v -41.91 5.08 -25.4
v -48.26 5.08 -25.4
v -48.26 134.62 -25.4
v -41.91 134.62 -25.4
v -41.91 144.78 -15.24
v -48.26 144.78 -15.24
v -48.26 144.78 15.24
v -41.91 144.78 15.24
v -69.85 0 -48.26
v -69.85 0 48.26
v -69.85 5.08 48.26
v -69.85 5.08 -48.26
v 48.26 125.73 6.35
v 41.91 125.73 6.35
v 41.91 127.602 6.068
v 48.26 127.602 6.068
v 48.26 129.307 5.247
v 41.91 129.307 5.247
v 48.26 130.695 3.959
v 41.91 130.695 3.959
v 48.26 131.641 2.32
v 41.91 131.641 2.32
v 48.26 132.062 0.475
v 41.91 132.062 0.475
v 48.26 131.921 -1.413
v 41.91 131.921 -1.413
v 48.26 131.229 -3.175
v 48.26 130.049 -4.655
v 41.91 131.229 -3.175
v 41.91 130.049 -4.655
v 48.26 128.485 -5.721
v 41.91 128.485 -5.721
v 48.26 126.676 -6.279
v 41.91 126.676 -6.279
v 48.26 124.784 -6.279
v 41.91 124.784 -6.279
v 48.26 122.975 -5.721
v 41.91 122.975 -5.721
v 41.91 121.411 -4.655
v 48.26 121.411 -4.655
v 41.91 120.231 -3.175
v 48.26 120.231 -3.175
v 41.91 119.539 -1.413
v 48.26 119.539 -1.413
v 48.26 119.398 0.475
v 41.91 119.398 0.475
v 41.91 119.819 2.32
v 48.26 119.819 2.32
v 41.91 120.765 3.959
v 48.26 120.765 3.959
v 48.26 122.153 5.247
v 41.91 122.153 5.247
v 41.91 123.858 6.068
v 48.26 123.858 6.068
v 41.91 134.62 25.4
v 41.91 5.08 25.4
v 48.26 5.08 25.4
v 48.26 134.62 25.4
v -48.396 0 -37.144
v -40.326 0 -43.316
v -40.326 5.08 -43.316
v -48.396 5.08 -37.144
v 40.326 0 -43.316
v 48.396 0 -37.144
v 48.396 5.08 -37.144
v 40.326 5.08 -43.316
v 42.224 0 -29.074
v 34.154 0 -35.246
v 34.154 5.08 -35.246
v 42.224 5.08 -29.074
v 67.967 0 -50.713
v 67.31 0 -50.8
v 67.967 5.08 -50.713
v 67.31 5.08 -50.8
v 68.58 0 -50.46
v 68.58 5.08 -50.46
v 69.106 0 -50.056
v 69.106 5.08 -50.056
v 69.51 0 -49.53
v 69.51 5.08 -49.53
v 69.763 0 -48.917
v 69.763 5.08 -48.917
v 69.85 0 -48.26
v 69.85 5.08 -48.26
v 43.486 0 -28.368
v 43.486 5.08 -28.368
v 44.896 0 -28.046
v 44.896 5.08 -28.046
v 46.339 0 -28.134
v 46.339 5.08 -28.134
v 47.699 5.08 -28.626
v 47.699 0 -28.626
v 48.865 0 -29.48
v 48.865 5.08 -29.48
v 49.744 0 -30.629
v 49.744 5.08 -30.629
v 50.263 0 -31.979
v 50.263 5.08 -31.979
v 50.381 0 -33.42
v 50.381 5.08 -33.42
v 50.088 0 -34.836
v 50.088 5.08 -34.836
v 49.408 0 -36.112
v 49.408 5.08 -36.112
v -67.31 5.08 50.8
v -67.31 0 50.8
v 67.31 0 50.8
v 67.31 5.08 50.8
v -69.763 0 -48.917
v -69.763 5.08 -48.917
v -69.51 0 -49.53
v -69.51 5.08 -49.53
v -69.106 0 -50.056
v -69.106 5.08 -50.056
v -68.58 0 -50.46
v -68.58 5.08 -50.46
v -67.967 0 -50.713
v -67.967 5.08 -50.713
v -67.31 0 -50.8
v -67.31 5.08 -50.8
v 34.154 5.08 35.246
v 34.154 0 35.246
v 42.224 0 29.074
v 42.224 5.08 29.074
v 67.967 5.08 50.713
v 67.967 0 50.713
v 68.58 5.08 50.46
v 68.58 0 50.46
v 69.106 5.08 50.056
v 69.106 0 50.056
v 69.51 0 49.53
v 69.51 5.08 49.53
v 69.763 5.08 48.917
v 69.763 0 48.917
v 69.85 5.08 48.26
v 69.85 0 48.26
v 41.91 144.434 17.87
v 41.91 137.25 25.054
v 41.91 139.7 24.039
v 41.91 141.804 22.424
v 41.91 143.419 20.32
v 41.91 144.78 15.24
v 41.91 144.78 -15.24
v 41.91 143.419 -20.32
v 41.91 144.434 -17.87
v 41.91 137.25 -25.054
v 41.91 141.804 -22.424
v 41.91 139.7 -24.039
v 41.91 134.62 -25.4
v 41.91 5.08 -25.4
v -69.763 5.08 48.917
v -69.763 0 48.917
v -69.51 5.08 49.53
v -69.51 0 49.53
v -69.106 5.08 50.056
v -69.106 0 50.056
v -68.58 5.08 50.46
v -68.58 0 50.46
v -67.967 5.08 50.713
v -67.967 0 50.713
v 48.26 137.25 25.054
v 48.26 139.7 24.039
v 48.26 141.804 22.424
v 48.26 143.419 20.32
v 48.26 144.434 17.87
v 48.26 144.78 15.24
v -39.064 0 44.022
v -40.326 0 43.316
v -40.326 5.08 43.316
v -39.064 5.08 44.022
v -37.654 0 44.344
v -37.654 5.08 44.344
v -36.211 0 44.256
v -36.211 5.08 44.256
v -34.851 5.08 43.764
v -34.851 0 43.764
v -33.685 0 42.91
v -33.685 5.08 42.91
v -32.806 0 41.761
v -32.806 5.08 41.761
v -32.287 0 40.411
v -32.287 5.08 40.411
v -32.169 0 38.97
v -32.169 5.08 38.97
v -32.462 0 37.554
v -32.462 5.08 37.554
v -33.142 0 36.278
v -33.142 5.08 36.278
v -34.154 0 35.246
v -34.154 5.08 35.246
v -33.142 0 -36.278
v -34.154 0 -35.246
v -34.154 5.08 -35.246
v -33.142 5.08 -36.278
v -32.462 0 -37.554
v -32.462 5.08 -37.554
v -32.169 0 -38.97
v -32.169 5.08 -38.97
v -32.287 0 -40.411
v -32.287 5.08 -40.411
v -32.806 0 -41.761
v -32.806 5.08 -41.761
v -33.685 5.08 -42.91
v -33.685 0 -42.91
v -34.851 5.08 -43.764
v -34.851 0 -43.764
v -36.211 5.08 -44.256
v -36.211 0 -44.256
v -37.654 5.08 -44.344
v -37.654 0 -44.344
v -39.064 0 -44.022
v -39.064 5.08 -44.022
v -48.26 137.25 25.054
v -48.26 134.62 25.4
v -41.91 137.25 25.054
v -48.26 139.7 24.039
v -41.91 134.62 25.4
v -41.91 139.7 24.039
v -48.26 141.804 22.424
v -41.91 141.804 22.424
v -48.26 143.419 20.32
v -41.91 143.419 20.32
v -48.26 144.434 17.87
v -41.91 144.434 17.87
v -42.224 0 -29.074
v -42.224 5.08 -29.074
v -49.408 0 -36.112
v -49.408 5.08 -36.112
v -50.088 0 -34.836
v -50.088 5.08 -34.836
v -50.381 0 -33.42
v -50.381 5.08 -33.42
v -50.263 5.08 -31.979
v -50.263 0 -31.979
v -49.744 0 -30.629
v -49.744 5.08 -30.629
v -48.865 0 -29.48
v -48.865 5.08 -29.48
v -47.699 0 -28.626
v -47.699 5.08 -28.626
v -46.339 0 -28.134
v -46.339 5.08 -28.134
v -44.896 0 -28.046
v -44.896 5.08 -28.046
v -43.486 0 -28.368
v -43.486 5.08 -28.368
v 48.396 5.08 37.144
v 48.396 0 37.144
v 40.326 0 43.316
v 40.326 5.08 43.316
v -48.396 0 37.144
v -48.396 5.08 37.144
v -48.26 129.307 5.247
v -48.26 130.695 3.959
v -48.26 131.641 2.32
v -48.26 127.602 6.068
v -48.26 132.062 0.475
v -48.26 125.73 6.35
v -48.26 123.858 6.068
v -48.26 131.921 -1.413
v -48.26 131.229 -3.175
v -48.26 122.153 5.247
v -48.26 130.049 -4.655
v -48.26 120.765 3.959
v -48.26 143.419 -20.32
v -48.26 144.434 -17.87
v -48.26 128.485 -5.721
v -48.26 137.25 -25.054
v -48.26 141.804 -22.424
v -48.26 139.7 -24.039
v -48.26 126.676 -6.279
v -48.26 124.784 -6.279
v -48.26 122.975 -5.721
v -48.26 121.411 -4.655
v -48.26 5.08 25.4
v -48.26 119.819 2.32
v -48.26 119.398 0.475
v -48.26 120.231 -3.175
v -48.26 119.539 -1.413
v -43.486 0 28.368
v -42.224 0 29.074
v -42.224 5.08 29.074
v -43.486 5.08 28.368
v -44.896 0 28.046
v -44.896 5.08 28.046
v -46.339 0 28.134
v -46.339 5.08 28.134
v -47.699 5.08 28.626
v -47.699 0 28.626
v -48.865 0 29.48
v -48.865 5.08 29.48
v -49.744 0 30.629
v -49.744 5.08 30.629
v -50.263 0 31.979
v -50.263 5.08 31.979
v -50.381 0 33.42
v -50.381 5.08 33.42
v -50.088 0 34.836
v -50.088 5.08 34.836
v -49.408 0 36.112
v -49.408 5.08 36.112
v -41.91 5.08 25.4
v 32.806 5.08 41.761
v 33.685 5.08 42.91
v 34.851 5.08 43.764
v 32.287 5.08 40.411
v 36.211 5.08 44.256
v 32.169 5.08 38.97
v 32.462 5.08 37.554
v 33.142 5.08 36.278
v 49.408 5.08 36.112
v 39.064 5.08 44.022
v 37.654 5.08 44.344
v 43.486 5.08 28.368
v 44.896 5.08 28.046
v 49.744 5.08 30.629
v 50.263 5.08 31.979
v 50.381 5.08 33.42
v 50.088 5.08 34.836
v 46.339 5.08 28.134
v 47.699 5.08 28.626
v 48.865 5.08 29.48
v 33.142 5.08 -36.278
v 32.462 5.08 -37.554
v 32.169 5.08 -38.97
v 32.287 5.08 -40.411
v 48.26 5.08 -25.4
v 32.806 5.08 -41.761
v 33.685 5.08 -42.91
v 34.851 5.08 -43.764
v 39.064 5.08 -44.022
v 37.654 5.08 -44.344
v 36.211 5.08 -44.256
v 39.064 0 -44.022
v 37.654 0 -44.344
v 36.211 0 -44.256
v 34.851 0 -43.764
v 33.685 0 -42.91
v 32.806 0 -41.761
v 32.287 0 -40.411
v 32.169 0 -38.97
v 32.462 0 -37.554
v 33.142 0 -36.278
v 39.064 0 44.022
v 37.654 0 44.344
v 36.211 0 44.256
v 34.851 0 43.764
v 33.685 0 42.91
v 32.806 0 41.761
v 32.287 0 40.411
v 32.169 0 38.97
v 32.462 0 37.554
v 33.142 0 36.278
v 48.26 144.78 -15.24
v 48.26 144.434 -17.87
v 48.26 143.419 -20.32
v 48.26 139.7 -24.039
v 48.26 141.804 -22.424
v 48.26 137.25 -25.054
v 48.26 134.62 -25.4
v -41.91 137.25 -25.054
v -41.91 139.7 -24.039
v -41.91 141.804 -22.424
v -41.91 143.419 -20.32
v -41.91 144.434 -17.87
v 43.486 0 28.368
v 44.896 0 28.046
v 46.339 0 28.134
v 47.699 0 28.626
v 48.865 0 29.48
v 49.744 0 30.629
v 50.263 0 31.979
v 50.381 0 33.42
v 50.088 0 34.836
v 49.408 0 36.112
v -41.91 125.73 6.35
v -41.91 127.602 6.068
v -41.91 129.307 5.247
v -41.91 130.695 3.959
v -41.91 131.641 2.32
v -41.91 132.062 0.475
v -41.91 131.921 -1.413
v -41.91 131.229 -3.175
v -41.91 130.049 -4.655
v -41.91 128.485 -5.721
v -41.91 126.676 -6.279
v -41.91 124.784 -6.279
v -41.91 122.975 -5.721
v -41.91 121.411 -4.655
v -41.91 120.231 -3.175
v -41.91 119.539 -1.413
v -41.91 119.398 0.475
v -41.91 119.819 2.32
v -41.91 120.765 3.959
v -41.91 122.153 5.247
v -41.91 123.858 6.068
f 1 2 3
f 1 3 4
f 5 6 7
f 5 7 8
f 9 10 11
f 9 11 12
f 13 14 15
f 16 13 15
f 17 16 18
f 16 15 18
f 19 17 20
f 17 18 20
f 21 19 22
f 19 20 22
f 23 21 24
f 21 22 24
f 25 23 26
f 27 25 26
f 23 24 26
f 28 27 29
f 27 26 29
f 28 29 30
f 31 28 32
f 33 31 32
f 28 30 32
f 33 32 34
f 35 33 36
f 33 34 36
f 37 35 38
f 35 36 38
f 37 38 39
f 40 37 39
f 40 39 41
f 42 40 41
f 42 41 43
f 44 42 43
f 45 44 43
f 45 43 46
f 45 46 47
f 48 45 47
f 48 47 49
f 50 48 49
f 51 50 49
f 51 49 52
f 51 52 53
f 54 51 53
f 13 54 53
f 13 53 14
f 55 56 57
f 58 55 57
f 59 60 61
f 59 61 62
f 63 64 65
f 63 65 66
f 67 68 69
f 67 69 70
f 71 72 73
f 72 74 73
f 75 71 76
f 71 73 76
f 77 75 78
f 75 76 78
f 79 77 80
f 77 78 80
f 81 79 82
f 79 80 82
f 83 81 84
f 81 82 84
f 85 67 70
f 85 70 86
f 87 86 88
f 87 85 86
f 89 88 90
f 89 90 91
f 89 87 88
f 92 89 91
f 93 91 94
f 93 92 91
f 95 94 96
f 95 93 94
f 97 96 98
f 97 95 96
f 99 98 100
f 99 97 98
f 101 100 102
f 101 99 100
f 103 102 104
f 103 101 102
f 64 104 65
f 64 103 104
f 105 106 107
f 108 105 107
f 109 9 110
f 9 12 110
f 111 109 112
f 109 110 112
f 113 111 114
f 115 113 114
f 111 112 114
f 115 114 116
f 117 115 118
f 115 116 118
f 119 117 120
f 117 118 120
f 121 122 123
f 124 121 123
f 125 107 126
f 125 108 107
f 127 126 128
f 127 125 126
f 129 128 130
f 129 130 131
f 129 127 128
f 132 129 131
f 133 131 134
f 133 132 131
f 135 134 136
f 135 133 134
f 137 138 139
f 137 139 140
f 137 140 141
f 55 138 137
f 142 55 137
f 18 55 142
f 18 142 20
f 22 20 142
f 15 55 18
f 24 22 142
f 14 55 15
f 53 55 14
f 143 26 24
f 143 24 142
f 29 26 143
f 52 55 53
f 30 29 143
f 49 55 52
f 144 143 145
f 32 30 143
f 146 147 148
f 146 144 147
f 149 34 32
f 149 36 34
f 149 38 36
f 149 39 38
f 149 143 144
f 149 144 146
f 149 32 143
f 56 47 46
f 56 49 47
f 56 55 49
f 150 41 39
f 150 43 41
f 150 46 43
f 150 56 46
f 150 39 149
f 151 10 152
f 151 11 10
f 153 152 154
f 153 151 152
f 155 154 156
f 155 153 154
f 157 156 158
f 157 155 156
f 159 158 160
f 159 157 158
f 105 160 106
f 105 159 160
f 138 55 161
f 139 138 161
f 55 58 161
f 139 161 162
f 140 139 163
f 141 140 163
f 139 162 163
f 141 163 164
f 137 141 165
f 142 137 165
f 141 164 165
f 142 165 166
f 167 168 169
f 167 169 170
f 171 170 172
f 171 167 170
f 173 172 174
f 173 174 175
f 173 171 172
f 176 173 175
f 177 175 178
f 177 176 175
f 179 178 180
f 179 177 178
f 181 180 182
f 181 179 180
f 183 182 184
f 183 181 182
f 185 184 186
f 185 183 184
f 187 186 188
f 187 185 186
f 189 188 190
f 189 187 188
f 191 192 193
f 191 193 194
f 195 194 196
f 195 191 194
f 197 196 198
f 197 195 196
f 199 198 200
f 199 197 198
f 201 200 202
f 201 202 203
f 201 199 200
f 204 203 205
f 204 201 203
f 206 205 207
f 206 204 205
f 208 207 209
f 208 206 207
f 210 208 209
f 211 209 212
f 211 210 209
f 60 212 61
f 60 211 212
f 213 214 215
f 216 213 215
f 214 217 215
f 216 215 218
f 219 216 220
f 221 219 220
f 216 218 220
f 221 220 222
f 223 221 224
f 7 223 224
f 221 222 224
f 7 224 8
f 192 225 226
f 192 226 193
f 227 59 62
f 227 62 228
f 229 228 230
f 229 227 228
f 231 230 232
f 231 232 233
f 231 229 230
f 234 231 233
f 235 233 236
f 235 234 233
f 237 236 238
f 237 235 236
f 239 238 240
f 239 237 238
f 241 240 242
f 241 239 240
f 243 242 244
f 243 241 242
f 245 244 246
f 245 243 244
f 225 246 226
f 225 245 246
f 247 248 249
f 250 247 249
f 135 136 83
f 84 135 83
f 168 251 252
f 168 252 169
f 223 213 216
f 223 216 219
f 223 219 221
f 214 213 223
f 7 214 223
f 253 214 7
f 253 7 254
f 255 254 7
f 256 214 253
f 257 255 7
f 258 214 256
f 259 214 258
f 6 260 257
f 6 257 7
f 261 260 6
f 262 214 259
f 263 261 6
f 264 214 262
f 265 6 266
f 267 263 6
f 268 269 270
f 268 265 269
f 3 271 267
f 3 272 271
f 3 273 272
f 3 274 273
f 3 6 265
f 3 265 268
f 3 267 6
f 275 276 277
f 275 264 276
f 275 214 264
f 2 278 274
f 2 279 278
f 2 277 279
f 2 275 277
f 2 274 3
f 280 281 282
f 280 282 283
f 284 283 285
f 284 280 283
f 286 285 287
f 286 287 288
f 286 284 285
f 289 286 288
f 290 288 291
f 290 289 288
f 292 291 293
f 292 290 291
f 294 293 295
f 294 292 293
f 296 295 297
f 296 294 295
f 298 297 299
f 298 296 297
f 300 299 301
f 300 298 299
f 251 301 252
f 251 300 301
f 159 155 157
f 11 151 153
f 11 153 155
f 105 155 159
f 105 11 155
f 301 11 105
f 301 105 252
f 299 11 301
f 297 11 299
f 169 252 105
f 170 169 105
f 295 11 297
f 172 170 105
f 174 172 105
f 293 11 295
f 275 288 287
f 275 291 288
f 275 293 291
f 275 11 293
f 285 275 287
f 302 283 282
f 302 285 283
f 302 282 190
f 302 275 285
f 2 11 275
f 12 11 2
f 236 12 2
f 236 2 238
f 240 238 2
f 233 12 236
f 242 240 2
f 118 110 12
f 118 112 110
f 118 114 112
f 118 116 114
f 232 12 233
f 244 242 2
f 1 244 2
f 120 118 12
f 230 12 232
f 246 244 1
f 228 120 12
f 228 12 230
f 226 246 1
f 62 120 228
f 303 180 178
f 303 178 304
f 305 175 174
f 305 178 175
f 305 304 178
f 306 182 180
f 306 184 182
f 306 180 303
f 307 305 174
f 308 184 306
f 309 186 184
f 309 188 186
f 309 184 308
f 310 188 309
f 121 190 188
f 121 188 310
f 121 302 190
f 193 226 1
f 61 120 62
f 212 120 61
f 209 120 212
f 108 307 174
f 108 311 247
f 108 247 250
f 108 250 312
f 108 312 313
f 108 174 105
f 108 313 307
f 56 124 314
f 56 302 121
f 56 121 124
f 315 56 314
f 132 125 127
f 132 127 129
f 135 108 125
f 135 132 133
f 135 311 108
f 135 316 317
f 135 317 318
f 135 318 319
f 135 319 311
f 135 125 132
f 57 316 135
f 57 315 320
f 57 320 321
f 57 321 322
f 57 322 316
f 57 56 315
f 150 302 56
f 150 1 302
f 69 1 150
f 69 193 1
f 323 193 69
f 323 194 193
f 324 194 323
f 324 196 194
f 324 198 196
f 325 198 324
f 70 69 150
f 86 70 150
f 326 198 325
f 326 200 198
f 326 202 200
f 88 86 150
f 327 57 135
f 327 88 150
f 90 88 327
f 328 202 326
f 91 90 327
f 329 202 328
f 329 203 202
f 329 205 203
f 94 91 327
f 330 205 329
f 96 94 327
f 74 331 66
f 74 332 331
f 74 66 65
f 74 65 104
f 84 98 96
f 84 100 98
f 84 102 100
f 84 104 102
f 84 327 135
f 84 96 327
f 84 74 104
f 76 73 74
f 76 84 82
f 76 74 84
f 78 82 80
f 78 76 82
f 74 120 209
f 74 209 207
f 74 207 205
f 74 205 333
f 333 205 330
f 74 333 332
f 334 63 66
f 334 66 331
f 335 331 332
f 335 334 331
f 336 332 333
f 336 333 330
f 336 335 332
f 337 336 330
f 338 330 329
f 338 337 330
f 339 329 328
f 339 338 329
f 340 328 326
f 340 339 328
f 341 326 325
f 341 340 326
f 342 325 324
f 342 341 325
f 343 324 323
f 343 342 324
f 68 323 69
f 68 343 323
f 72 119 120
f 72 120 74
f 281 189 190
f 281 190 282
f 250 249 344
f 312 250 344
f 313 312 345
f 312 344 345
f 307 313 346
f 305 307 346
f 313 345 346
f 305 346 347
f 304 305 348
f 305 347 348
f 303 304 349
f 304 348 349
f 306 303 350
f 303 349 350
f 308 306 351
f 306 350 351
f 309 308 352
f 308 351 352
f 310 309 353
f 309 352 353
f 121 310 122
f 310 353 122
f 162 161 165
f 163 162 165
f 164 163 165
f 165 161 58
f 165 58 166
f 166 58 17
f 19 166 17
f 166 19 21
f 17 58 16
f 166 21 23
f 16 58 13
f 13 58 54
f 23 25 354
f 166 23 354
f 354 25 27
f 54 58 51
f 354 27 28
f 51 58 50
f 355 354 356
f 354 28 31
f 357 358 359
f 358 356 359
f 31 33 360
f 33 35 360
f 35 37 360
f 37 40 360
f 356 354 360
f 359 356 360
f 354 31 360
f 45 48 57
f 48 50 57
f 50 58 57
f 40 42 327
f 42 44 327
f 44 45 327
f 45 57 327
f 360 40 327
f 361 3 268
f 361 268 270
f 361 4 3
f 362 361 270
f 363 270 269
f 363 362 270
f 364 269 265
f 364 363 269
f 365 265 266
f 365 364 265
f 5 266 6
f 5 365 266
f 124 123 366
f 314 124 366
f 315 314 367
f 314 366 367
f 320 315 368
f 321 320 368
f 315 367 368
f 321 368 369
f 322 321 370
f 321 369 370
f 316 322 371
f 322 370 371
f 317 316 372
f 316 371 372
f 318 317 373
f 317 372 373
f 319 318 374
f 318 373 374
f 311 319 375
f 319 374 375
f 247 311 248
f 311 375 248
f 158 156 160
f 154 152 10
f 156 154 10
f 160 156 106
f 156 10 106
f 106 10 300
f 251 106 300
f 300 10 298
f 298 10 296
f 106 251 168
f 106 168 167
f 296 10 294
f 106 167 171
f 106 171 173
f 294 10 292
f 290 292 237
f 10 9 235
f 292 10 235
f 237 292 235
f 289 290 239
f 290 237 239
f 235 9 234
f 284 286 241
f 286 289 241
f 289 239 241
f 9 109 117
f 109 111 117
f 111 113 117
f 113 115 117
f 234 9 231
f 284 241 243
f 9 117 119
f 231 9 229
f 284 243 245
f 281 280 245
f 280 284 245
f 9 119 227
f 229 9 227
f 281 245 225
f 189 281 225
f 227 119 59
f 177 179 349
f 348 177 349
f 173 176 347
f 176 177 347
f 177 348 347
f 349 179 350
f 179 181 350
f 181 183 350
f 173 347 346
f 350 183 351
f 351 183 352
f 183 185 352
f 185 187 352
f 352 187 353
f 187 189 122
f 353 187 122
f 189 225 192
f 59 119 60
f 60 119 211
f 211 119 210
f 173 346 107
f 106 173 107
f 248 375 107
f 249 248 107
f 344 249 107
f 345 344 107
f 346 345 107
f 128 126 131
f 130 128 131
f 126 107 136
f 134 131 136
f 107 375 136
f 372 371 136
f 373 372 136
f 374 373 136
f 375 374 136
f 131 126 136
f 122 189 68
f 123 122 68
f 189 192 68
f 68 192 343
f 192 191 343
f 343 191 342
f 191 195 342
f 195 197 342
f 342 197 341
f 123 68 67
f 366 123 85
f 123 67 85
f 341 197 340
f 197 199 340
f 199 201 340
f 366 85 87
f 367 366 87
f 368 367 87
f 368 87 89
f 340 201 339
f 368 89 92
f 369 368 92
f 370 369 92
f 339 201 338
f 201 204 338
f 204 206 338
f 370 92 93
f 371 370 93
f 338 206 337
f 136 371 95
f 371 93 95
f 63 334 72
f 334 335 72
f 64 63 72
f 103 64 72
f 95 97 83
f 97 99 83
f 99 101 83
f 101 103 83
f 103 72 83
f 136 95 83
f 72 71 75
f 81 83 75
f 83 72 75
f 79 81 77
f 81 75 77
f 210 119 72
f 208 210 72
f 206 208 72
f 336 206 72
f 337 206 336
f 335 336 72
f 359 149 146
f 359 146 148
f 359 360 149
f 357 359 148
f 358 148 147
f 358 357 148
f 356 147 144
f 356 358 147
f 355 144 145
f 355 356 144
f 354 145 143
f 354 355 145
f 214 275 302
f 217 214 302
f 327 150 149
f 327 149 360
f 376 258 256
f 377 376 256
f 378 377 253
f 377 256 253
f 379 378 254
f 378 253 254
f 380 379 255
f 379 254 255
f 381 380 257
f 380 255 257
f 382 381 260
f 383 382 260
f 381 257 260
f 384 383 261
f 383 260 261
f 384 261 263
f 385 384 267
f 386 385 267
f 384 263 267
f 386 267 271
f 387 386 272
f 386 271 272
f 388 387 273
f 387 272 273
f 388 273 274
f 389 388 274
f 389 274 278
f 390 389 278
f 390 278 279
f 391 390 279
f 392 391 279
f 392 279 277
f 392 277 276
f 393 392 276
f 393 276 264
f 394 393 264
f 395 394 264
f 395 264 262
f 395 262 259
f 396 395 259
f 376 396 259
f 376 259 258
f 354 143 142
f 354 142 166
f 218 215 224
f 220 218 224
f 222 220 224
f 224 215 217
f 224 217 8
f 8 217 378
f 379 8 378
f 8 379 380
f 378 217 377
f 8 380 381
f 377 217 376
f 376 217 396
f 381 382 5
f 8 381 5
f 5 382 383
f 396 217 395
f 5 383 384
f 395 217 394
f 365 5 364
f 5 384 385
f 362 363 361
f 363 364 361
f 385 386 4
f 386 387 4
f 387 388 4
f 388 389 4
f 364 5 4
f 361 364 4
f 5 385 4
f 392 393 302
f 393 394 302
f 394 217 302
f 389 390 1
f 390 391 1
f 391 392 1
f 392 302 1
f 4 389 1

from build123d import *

# Parameters (mm, degrees)
SKETCH1_W           = 139.7
SKETCH1_H           = 101.6
BOSS_EXTRUDE1_DEPTH = 5.08
FILLET1_R           = 2.54
SKETCH2_W           = 6.35
SKETCH2_H           = 50.8
BOSS_EXTRUDE2_DEPTH = 139.7
FILLET2_R           = 10.16
SKETCH3_R           = 6.35
CUT_EXTRUDE1_DEPTH  = 119.11


with BuildPart() as part:
    # Sketch1 → Boss-Extrude1 (new body)
    with BuildSketch(Plane(origin=(0, 0, 0), x_dir=(1, 0, 0), z_dir=(0, 1, 0))):
        Rectangle(SKETCH1_W, SKETCH1_H)
        with BuildLine():
            ThreePointArc((-40.325508755, -43.316184338), (-33.204324417, -42.366693093), (-34.153815662, -35.245508755))
            Line((-34.153815662, -35.245508755), (-42.224491245, -29.073815662))
            ThreePointArc((-42.224491245, -29.073815662), (-49.345675583, -30.023306907), (-48.396184338, -37.144491245))
            Line((-48.396184338, -37.144491245), (-40.325508755, -43.316184338))
        make_face(mode=Mode.SUBTRACT)
        with BuildLine():
            ThreePointArc((-48.396184338, 37.144491245), (-49.345675583, 30.023306907), (-42.224491245, 29.073815662))
            Line((-42.224491245, 29.073815662), (-34.153815662, 35.245508755))
            ThreePointArc((-34.153815662, 35.245508755), (-33.204324417, 42.366693093), (-40.325508755, 43.316184338))
            Line((-40.325508755, 43.316184338), (-48.396184338, 37.144491245))
        make_face(mode=Mode.SUBTRACT)
        with BuildLine():
            ThreePointArc((40.325508755, 43.316184338), (33.204324417, 42.366693093), (34.153815662, 35.245508755))
            Line((34.153815662, 35.245508755), (42.224491245, 29.073815662))
            ThreePointArc((42.224491245, 29.073815662), (49.345675583, 30.023306907), (48.396184338, 37.144491245))
            Line((48.396184338, 37.144491245), (40.325508755, 43.316184338))
        make_face(mode=Mode.SUBTRACT)
        with BuildLine():
            Line((48.396184338, -37.144491245), (40.325508755, -43.316184338))
            ThreePointArc((40.325508755, -43.316184338), (33.204324417, -42.366693093), (34.153815662, -35.245508755))
            Line((34.153815662, -35.245508755), (42.224491245, -29.073815662))
            ThreePointArc((42.224491245, -29.073815662), (49.345675583, -30.023306907), (48.396184338, -37.144491245))
        make_face(mode=Mode.SUBTRACT)
    extrude(amount=BOSS_EXTRUDE1_DEPTH)

    # Fillet1
    fillet1_edges = [part.edges().sort_by_distance(p)[0] for p in [
        (69.85, 2.54, -50.8),
        (69.85, 2.54, 50.8),
        (-69.85, 2.54, 50.8),
        (-69.85, 2.54, -50.8),
    ]]
    fillet(fillet1_edges, radius=FILLET1_R)

    # Sketch2 → Boss-Extrude2 (add)
    with BuildSketch(Plane(origin=(0, 5.08, 0), x_dir=(1, 0, 0), z_dir=(0, 1, 0))):
        with Locations((45.085, 0)):
            Rectangle(SKETCH2_W, SKETCH2_H)
        with Locations((-45.085, 0)):
            Rectangle(SKETCH2_W, SKETCH2_H)
    extrude(amount=BOSS_EXTRUDE2_DEPTH)

    # Fillet2
    fillet2_edges = [part.edges().sort_by_distance(p)[0] for p in [
        (-45.085, 144.78, -25.4),
        (-45.085, 144.78, 25.4),
        (45.085, 144.78, -25.4),
        (45.085, 144.78, 25.4),
    ]]
    fillet(fillet2_edges, radius=FILLET2_R)

    # Sketch3 → Cut-Extrude1 (cut, through all)
    with BuildSketch(Plane.ZY.offset(48.26)):
        with Locations((0, 125.73)):
            Circle(SKETCH3_R)
    extrude(amount=-CUT_EXTRUDE1_DEPTH, mode=Mode.SUBTRACT)


solid = part.part
